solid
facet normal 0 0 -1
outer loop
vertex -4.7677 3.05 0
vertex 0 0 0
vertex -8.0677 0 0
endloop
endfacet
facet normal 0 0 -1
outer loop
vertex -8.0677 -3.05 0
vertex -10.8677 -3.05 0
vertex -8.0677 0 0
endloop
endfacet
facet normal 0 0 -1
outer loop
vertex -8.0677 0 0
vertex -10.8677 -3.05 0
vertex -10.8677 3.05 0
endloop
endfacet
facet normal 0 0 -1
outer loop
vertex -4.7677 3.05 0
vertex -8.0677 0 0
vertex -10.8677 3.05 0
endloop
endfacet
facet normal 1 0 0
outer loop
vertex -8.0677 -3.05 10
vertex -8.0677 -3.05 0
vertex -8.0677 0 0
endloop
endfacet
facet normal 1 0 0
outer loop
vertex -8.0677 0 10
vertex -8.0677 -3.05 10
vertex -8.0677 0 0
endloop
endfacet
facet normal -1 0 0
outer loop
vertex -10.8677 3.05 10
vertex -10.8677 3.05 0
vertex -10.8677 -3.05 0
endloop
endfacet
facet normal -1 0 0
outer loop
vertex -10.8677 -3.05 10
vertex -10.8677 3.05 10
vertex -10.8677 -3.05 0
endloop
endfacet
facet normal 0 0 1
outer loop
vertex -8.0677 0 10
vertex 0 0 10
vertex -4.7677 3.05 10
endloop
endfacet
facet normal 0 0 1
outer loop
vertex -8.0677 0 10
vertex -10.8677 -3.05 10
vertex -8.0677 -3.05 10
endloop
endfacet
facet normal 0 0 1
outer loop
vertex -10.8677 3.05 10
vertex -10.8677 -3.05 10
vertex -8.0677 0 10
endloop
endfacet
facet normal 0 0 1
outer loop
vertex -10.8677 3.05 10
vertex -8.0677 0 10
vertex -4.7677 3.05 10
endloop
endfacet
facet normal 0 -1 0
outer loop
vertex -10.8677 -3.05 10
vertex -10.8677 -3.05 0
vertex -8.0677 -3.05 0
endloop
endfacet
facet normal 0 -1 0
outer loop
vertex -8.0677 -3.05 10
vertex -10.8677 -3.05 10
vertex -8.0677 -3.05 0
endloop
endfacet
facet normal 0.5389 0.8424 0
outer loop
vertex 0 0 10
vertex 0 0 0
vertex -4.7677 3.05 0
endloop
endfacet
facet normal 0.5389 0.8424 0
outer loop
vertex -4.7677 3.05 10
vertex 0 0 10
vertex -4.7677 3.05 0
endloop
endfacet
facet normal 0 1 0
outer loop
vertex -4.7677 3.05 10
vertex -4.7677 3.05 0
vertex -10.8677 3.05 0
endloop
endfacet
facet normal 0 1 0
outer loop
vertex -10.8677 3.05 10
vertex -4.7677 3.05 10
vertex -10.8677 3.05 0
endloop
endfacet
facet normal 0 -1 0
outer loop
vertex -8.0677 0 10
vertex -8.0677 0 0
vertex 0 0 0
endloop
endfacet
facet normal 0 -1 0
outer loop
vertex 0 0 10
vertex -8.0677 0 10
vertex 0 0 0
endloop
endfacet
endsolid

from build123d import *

# Parameters (mm, degrees)
SALIENTE_EXTRUIR1_DEPTH = 10


with BuildPart() as part:
    # Croquis1 → Saliente-Extruir1 (new body)
    with BuildSketch(Plane(origin=(0, 0, 0), x_dir=(0, 1, 0), z_dir=(0, 0, 1))):
        Polygon((3.05, 8.067721178), (0, 8.067721178), (0, 0), (3.05, 4.767721178), align=None)
        Polygon((-3.05, 10.867721178), (-3.05, 8.067721178), (0, 8.067721178), (3.05, 8.067721178), (3.05, 10.867721178), align=None)
    extrude(amount=SALIENTE_EXTRUIR1_DEPTH)


solid = part.part
